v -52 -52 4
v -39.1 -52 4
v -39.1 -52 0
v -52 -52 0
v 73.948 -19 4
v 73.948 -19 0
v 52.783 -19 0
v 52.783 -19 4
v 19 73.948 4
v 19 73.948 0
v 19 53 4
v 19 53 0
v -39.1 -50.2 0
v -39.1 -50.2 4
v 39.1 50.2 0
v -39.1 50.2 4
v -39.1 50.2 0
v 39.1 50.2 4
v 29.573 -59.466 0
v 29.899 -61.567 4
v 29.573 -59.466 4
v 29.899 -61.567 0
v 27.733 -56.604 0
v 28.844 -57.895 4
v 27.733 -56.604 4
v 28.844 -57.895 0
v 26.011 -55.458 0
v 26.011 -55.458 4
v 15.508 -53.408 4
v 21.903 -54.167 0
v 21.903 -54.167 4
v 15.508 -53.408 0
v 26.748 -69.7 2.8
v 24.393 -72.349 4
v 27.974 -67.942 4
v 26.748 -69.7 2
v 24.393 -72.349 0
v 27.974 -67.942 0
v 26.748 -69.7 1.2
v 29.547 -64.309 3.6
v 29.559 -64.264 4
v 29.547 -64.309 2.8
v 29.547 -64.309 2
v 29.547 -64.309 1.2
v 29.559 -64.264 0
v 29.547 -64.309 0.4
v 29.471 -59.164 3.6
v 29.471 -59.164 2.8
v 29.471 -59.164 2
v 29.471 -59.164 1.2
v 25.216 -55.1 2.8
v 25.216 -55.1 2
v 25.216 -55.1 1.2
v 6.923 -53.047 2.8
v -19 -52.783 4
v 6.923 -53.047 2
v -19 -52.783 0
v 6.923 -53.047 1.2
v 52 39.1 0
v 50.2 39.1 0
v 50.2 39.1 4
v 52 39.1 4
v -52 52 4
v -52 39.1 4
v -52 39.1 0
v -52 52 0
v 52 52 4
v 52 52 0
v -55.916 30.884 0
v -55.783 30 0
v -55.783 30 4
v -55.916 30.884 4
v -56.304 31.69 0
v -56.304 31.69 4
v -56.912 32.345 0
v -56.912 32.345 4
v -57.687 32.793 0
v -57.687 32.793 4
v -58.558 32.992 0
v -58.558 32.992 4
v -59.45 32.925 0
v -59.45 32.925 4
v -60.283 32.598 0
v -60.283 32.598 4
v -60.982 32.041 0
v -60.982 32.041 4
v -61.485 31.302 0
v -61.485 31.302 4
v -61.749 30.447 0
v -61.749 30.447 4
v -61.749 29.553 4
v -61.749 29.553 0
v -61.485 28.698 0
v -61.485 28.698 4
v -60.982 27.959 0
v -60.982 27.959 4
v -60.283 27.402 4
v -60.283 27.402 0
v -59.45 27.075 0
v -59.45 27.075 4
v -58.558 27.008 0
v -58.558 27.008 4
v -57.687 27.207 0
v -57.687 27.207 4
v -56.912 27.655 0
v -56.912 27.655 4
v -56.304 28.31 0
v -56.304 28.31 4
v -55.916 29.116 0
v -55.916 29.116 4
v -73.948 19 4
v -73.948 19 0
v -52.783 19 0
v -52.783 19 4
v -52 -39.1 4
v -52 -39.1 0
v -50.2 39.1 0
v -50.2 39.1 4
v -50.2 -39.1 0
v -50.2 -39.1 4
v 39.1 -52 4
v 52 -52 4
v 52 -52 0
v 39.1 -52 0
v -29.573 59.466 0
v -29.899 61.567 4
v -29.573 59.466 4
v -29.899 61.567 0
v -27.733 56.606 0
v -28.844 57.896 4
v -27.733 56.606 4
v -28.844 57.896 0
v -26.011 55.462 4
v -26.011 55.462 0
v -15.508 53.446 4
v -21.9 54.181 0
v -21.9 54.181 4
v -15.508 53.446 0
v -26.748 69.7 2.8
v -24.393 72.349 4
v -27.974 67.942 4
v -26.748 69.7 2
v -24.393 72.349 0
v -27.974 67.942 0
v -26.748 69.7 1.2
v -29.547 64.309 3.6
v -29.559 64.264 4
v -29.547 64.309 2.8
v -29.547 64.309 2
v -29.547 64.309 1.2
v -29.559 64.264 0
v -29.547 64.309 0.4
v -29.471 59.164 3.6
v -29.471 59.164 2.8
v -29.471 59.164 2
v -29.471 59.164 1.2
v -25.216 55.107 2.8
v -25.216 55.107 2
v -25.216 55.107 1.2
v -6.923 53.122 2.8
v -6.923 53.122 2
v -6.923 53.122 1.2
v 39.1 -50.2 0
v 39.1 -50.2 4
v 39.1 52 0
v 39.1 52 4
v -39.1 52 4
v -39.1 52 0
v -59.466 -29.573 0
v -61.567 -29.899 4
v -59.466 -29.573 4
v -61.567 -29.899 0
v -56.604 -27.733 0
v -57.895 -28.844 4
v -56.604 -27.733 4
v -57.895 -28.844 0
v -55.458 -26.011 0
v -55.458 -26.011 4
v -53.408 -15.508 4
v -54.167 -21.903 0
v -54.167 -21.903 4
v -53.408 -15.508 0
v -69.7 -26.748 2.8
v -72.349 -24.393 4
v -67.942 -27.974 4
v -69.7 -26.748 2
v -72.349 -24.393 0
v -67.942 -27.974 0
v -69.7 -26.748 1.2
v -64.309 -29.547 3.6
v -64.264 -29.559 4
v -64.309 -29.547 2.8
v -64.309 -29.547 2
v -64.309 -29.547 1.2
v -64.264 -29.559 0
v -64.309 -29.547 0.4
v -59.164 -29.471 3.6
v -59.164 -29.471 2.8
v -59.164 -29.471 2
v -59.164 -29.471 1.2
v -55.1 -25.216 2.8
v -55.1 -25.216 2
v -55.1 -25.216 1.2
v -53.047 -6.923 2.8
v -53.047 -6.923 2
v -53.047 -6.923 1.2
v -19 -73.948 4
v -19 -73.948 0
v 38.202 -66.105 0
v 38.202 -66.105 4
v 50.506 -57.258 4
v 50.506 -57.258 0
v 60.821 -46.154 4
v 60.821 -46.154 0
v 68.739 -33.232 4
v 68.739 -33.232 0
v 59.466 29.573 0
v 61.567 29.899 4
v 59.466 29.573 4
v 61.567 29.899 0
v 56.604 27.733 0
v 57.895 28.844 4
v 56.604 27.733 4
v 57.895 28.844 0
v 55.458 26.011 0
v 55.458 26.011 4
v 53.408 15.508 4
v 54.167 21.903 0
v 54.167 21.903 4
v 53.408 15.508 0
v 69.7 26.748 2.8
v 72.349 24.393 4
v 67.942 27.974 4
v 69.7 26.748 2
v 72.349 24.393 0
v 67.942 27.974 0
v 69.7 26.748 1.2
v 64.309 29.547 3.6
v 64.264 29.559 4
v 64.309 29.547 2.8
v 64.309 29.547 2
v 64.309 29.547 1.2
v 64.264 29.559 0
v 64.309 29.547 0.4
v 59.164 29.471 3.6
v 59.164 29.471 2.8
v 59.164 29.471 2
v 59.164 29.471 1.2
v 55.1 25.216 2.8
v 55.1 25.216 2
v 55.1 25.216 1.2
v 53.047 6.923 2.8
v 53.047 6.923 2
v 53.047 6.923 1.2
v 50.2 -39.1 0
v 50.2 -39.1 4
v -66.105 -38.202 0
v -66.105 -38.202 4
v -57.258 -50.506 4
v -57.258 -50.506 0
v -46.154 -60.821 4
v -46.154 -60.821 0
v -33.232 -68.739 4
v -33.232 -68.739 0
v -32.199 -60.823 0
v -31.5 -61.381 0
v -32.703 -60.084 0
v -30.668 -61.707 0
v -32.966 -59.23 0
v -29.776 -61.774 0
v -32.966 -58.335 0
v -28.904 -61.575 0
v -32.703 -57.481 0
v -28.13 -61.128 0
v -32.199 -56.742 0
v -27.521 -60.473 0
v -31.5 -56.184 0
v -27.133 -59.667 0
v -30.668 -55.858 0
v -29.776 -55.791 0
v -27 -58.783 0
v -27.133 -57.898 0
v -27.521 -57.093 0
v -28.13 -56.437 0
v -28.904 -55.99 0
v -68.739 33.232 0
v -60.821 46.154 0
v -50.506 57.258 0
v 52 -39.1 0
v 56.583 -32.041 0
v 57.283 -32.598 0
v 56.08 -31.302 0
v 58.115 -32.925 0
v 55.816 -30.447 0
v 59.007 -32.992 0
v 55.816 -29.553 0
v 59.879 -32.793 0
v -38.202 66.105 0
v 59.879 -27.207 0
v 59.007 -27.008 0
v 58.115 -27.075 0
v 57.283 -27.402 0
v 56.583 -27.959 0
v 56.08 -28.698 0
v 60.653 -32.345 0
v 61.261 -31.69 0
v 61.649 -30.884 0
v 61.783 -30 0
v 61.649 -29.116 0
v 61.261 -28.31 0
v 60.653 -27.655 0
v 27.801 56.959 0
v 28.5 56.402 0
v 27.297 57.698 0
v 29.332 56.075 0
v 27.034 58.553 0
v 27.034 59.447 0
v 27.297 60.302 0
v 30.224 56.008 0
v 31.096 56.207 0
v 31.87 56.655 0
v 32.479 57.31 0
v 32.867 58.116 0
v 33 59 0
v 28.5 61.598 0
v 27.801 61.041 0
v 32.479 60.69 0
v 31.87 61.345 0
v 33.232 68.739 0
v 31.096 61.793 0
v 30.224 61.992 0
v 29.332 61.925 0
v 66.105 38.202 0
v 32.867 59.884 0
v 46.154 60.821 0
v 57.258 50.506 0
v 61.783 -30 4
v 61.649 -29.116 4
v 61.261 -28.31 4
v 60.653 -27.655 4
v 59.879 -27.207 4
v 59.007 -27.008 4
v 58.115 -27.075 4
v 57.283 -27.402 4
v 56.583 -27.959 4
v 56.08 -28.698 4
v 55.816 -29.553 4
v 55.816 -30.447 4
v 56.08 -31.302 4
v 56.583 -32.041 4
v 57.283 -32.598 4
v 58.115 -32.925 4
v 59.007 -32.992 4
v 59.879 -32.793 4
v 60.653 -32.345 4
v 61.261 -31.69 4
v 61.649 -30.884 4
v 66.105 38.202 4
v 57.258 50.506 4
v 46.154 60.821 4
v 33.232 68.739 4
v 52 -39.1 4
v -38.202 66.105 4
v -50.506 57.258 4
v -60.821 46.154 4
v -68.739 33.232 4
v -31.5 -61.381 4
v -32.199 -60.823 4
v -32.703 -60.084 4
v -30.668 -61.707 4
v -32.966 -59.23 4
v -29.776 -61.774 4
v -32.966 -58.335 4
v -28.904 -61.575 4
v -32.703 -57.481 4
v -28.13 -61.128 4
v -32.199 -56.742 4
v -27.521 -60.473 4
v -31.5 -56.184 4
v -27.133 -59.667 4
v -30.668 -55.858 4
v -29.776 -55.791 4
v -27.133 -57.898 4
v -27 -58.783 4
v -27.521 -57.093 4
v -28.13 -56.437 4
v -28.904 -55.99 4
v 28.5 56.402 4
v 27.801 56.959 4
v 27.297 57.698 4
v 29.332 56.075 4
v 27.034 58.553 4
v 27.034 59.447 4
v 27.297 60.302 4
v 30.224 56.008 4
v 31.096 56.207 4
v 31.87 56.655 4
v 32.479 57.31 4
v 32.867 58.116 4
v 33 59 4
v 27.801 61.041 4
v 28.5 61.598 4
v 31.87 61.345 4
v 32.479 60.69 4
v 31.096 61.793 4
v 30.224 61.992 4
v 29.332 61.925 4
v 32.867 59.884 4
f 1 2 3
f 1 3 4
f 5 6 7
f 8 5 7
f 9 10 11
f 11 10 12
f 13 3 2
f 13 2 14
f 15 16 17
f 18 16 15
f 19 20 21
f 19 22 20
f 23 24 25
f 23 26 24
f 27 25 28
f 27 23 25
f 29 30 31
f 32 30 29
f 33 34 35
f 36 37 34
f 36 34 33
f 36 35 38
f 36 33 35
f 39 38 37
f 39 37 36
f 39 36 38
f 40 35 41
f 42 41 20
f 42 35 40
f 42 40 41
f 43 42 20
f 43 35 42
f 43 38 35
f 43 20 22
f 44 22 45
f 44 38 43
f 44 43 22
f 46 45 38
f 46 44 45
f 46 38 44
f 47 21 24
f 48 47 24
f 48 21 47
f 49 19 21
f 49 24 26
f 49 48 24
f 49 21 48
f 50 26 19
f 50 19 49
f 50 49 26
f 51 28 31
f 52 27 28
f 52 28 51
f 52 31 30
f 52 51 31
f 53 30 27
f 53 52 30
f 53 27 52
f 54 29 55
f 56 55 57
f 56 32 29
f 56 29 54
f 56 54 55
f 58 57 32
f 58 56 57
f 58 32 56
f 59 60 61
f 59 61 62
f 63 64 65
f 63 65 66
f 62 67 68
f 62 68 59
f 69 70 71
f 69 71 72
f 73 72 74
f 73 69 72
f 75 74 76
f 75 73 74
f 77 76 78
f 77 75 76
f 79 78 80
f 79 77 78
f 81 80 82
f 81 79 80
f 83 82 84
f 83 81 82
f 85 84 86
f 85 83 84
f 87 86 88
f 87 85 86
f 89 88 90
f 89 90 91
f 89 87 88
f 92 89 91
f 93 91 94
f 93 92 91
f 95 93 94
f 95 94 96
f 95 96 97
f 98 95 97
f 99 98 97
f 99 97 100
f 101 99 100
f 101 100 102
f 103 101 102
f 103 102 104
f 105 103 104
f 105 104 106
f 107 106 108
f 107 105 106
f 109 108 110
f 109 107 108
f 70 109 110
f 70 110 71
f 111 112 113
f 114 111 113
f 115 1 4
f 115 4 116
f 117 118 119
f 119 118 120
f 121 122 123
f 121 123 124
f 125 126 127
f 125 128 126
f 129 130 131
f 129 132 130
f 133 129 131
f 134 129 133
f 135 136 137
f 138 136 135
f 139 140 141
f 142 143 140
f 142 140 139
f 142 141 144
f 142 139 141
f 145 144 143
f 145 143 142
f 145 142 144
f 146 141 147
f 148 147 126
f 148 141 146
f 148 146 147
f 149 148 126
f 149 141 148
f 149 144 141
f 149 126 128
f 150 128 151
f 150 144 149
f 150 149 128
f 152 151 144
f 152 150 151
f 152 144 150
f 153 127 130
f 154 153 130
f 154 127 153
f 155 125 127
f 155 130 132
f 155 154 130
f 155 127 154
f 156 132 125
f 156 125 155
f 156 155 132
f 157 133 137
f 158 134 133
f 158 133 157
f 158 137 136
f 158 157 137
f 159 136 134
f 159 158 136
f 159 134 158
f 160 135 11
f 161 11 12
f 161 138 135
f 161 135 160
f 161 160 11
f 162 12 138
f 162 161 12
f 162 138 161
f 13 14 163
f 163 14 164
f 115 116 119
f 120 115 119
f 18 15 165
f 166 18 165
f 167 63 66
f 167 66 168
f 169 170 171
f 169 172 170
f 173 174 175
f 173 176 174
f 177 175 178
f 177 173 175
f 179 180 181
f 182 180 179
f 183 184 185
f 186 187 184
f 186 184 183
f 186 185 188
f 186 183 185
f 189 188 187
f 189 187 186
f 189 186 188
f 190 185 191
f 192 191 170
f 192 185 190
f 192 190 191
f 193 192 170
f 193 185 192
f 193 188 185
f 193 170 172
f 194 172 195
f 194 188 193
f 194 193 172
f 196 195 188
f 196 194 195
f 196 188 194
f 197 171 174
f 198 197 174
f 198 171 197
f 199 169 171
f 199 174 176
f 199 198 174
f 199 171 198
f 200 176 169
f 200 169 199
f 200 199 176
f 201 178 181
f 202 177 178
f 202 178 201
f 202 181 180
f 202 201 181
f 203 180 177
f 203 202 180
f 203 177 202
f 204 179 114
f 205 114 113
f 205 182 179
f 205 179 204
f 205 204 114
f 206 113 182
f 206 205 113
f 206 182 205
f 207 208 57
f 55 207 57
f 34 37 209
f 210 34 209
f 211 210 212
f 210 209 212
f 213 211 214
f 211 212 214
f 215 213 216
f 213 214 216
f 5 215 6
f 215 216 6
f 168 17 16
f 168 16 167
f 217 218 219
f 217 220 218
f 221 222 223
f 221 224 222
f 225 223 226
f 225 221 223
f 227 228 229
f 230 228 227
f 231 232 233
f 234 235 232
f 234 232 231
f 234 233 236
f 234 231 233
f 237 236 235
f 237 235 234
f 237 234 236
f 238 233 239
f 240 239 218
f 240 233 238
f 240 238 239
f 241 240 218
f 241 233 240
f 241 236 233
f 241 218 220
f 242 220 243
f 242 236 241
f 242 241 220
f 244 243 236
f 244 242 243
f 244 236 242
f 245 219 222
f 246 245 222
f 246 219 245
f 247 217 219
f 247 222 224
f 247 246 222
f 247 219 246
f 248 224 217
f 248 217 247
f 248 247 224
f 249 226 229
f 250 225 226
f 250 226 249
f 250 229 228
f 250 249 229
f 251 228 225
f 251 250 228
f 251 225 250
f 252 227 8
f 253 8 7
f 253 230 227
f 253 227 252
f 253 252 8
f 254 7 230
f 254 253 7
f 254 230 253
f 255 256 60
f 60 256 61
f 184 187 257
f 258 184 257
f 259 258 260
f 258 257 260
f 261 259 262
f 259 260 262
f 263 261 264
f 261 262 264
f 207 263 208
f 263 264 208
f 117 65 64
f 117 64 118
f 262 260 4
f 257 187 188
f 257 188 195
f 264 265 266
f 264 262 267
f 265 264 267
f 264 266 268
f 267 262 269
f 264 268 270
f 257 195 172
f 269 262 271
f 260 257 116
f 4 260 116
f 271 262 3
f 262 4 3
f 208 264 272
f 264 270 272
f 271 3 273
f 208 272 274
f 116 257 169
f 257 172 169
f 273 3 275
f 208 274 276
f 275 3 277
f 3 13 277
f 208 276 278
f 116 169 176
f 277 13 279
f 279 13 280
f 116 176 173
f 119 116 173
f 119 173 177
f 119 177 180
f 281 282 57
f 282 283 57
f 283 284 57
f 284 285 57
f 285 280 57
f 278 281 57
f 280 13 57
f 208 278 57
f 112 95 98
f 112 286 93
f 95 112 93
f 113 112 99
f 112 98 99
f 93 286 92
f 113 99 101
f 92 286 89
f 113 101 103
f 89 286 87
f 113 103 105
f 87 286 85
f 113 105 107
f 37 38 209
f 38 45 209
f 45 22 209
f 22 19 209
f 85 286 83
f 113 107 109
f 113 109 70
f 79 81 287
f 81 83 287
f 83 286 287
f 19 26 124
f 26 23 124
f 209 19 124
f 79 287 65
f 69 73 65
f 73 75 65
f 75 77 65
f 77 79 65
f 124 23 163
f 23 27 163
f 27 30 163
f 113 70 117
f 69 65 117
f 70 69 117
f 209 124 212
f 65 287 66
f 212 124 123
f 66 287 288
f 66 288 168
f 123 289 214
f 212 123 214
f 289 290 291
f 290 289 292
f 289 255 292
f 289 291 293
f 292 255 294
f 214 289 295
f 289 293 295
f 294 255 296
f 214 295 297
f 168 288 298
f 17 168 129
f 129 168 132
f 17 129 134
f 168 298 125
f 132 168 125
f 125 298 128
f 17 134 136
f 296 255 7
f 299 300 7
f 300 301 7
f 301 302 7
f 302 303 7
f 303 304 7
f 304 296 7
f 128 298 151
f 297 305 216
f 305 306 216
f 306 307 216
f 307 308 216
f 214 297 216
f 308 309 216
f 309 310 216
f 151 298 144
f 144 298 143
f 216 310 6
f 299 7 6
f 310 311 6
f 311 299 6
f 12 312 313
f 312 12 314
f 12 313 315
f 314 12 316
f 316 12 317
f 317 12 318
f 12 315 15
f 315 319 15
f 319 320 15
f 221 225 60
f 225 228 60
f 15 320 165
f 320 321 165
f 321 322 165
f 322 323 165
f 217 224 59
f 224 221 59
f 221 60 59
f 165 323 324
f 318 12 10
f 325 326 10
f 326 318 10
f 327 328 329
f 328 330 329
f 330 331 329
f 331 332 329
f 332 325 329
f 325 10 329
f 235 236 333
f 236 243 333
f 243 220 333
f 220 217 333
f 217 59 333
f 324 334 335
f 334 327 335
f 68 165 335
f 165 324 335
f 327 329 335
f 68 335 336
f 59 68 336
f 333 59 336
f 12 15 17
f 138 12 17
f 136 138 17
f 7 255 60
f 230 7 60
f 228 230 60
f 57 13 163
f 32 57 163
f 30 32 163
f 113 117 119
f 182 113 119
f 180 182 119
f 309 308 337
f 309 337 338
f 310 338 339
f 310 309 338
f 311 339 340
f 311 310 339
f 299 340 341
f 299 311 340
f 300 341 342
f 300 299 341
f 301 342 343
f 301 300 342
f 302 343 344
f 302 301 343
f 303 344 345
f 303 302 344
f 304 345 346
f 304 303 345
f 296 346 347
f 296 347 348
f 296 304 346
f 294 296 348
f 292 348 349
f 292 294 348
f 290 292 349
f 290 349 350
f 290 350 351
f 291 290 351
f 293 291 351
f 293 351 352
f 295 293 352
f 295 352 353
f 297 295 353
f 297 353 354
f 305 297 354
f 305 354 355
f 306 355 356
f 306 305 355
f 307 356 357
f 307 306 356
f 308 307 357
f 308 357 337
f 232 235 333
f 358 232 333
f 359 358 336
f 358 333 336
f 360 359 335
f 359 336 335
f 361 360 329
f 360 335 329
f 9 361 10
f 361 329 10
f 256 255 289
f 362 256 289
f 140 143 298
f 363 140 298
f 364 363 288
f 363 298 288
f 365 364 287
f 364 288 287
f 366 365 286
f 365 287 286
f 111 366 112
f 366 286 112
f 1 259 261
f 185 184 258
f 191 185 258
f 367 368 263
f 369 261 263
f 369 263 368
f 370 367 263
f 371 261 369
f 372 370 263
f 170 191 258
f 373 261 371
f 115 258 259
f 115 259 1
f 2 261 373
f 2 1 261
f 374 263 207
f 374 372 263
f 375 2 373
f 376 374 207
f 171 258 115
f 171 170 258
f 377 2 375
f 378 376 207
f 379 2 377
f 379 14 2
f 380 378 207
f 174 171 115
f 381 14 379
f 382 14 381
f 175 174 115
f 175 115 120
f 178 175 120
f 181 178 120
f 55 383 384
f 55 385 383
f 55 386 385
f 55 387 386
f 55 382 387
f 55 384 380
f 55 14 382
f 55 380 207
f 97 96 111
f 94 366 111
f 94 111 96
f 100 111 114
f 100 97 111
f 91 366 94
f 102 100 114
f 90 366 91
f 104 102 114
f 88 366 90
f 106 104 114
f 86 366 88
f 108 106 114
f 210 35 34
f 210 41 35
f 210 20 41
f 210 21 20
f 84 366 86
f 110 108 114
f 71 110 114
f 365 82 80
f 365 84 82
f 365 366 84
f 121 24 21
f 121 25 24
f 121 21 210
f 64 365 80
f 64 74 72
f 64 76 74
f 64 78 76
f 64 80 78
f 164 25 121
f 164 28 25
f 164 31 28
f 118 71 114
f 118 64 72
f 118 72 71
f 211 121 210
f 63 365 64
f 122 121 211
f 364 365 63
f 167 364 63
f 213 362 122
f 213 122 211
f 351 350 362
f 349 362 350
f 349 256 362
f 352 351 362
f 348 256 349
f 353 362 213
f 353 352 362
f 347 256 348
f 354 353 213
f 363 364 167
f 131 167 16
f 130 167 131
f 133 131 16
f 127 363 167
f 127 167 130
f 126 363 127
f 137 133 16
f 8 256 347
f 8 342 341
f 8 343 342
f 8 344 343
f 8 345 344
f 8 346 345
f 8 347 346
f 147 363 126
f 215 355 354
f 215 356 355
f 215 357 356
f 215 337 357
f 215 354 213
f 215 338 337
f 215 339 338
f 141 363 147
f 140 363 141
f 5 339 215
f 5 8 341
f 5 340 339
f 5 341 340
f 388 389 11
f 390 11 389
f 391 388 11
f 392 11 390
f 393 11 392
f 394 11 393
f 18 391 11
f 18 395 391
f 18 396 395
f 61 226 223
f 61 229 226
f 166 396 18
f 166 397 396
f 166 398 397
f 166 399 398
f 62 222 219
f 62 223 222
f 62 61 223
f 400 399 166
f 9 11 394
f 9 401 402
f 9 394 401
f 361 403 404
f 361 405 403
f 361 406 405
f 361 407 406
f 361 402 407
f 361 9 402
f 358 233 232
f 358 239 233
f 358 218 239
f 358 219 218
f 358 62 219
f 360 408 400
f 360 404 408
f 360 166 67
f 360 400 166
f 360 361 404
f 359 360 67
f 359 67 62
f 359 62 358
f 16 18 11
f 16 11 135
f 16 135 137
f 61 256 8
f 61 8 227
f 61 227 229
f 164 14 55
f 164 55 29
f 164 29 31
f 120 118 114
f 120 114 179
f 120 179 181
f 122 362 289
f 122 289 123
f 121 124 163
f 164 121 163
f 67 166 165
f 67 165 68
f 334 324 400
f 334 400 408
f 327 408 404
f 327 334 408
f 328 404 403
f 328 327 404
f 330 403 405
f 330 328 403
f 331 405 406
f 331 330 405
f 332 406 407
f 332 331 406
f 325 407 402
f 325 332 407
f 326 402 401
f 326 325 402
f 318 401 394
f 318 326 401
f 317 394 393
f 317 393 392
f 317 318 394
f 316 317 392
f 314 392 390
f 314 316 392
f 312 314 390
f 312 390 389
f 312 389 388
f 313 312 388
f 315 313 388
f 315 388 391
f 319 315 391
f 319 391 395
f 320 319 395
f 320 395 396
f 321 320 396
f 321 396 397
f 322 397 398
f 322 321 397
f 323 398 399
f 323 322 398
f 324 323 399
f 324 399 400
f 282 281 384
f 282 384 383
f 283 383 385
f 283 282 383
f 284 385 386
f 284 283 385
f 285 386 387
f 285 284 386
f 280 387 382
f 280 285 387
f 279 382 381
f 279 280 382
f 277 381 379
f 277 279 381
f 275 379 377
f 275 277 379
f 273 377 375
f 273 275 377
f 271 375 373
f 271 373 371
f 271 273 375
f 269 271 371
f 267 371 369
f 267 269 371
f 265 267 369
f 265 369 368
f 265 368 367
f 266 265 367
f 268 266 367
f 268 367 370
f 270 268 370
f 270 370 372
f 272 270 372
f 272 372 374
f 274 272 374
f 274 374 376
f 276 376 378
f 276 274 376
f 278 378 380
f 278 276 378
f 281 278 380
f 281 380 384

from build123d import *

# Parameters (mm, degrees)
BOSS_EXTRUDE3_OUTLINE_R = 3
BOSS_EXTRUDE3_DEPTH     = 4
CUT_EXTRUDE1_DEPTH      = 4
CUT_EXTRUDE2_DEPTH      = 4
SKETCH4_W               = 0.4
SKETCH4_H               = 1.8
SKETCH4_W_2             = 1.8
SKETCH4_H_2             = 0.4
BOSS_EXTRUDE4_DEPTH     = 4


# Read off the part's stored shape, not the designer's step: Boss-Extrude3
with BuildPart() as part:
    # Boss-Extrude3 outline → Boss-Extrude3 (new body)
    with BuildSketch(Plane.XY):
        with BuildLine():
            add(Edge.make_bspline(
                [(24.392810524, -72.348554199), (27.040667073, -69.541086329), (29.089162938, -67.428574969), (30.241441862, -64.355831171), (31.073643307, -60.963009895), (30.561519341, -59.042545022), (29.217193929, -56.673971678), (27.488775543, -54.241382838), (25.105954954, -53), (17.37432721, -53), (-19, -52.782560411)],
                knots=[0, 0, 0, 0, 0, 0, 0, 0, 0, 0, 0, 1, 1, 1, 1, 1, 1, 1, 1, 1, 1, 1], degree=10))
            ThreePointArc((24.392810524, -72.348554199), (55.939709188, -51.962211615), (73.948106805, -19))
            Line((73.948106805, -19), (52.782560411, -19))
            add(Edge.make_bspline(
                [(72.348554199, 24.392810524), (69.541086329, 27.040667073), (67.428574969, 29.089162938), (64.355831171, 30.241441862), (60.963009895, 31.073643307), (59.042545022, 30.561519341), (56.673971678, 29.217193929), (54.241382838, 27.488775543), (53, 25.105954954), (53, 17.37432721), (52.782560411, -19)],
                knots=[0, 0, 0, 0, 0, 0, 0, 0, 0, 0, 0, 1, 1, 1, 1, 1, 1, 1, 1, 1, 1, 1], degree=10))
            ThreePointArc((72.348554199, 24.392810524), (51.962211615, 55.939709188), (19, 73.948106805))
            Line((19, 73.948106805), (19, 53))
            add(Edge.make_bspline(
                [(-24.392810524, 72.348554199), (-27.040667073, 69.541086329), (-29.089162938, 67.428574969), (-30.241441862, 64.355831171), (-31.073643307, 60.963009895), (-30.561519341, 59.042545022), (-29.217193929, 56.673971678), (-27.488775543, 54.241382838), (-25.105954954, 53), (-17.37432721, 53), (19, 53)],
                knots=[0, 0, 0, 0, 0, 0, 0, 0, 0, 0, 0, 1, 1, 1, 1, 1, 1, 1, 1, 1, 1, 1], degree=10))
            ThreePointArc((-24.392810524, 72.348554199), (-55.939709188, 51.962211615), (-73.948106805, 19))
            Line((-73.948106805, 19), (-52.782560411, 19))
            add(Edge.make_bspline(
                [(-72.348554199, -24.392810524), (-69.541086329, -27.040667073), (-67.428574969, -29.089162938), (-64.355831171, -30.241441862), (-60.963009895, -31.073643307), (-59.042545022, -30.561519341), (-56.673971678, -29.217193929), (-54.241382838, -27.488775543), (-53, -25.105954954), (-53, -17.37432721), (-52.782560411, 19)],
                knots=[0, 0, 0, 0, 0, 0, 0, 0, 0, 0, 0, 1, 1, 1, 1, 1, 1, 1, 1, 1, 1, 1], degree=10))
            ThreePointArc((-72.348554199, -24.392810524), (-51.962211615, -55.939709188), (-19, -73.948106805))
            Line((-19, -73.948106805), (-19, -52.782560411))
        make_face()
        with Locations((-30, -58.782560411)):
            Circle(BOSS_EXTRUDE3_OUTLINE_R, mode=Mode.SUBTRACT)
        with Locations((58.782560411, -30)):
            Circle(BOSS_EXTRUDE3_OUTLINE_R, mode=Mode.SUBTRACT)
        with Locations((-58.782560411, 30)):
            Circle(BOSS_EXTRUDE3_OUTLINE_R, mode=Mode.SUBTRACT)
        Polygon((-38.9, -51.6), (-51.6, -51.6), (-51.6, -38.9), (-50, -38.9), (-50, 38.9), (-51.6, 38.9), (-51.6, 51.6), (-38.9, 51.6), (-38.9, 50), (38.9, 50), (38.9, 51.6), (51.6, 51.6), (51.6, 38.9), (50, 38.9), (50, -38.9), (51.6, -38.9), (51.6, -51.6), (38.9, -51.6), (38.9, -50), (-38.9, -50), align=None, mode=Mode.SUBTRACT)
        with Locations((30, 59)):
            Circle(BOSS_EXTRUDE3_OUTLINE_R, mode=Mode.SUBTRACT)
    extrude(amount=BOSS_EXTRUDE3_DEPTH)

    # Sketch2 → Cut-Extrude1 (cut)
    with BuildSketch(Plane.XY.offset(4)):
        Polygon((51.8, -38.7), (50.2, -38.7), (50.2, 38.7), (51.8, 38.7), (51.8, 51.8), (38.7, 51.8), (38.7, 50.2), (-38.7, 50.2), (-38.7, 51.8), (-51.8, 51.8), (-51.8, 38.7), (-50.2, 38.7), (-50.2, -38.7), (-51.8, -38.7), (-51.8, -51.8), (-38.7, -51.8), (-38.7, -50.2), (38.7, -50.2), (38.7, -51.8), (51.8, -51.8), align=None)
        Polygon((51.6, -38.9), (50, -38.9), (50, 38.9), (51.6, 38.9), (51.6, 51.6), (38.9, 51.6), (38.9, 50), (-38.9, 50), (-38.9, 51.6), (-51.6, 51.6), (-51.6, 38.9), (-50, 38.9), (-50, -38.9), (-51.6, -38.9), (-51.6, -51.6), (-38.9, -51.6), (-38.9, -50), (38.9, -50), (38.9, -51.6), (51.6, -51.6), align=None, mode=Mode.SUBTRACT)
    extrude(amount=-CUT_EXTRUDE1_DEPTH, mode=Mode.SUBTRACT)

    # Sketch3 → Cut-Extrude2 (cut)
    with BuildSketch(Plane.XY.offset(4)):
        Polygon((-51.8, -51.8), (-38.7, -51.8), (-38.7, -52), (-52, -52), (-52, -38.7), (-51.8, -38.7), align=None)
        Polygon((38.7, -51.8), (51.8, -51.8), (51.8, -38.7), (52, -38.7), (52, -52), (38.7, -52), align=None)
        Polygon((51.8, 38.7), (51.8, 51.8), (38.7, 51.8), (38.7, 52), (52, 52), (52, 38.7), align=None)
        Polygon((-51.8, 51.8), (-51.8, 38.7), (-52, 38.7), (-52, 52), (-38.7, 52), (-38.7, 51.8), align=None)
    extrude(amount=-CUT_EXTRUDE2_DEPTH, mode=Mode.SUBTRACT)

    # Sketch4 → Boss-Extrude4 (add)
    with BuildSketch(Plane.XY.offset(4)):
        with Locations((-38.9, 51.1)):
            Rectangle(SKETCH4_W, SKETCH4_H)
        with Locations((-51.1, 38.9)):
            Rectangle(SKETCH4_W_2, SKETCH4_H_2)
        with Locations((38.9, 51.1)):
            Rectangle(SKETCH4_W, SKETCH4_H)
        with Locations((51.1, 38.9)):
            Rectangle(SKETCH4_W_2, SKETCH4_H_2)
        with Locations((38.9, -51.1)):
            Rectangle(SKETCH4_W, SKETCH4_H)
        with Locations((51.1, -38.9)):
            Rectangle(SKETCH4_W_2, SKETCH4_H_2)
        with Locations((-51.1, -38.9)):
            Rectangle(SKETCH4_W_2, SKETCH4_H_2)
        with Locations((-38.9, -51.1)):
            Rectangle(SKETCH4_W, SKETCH4_H)
    extrude(amount=-BOSS_EXTRUDE4_DEPTH)


solid = part.part
